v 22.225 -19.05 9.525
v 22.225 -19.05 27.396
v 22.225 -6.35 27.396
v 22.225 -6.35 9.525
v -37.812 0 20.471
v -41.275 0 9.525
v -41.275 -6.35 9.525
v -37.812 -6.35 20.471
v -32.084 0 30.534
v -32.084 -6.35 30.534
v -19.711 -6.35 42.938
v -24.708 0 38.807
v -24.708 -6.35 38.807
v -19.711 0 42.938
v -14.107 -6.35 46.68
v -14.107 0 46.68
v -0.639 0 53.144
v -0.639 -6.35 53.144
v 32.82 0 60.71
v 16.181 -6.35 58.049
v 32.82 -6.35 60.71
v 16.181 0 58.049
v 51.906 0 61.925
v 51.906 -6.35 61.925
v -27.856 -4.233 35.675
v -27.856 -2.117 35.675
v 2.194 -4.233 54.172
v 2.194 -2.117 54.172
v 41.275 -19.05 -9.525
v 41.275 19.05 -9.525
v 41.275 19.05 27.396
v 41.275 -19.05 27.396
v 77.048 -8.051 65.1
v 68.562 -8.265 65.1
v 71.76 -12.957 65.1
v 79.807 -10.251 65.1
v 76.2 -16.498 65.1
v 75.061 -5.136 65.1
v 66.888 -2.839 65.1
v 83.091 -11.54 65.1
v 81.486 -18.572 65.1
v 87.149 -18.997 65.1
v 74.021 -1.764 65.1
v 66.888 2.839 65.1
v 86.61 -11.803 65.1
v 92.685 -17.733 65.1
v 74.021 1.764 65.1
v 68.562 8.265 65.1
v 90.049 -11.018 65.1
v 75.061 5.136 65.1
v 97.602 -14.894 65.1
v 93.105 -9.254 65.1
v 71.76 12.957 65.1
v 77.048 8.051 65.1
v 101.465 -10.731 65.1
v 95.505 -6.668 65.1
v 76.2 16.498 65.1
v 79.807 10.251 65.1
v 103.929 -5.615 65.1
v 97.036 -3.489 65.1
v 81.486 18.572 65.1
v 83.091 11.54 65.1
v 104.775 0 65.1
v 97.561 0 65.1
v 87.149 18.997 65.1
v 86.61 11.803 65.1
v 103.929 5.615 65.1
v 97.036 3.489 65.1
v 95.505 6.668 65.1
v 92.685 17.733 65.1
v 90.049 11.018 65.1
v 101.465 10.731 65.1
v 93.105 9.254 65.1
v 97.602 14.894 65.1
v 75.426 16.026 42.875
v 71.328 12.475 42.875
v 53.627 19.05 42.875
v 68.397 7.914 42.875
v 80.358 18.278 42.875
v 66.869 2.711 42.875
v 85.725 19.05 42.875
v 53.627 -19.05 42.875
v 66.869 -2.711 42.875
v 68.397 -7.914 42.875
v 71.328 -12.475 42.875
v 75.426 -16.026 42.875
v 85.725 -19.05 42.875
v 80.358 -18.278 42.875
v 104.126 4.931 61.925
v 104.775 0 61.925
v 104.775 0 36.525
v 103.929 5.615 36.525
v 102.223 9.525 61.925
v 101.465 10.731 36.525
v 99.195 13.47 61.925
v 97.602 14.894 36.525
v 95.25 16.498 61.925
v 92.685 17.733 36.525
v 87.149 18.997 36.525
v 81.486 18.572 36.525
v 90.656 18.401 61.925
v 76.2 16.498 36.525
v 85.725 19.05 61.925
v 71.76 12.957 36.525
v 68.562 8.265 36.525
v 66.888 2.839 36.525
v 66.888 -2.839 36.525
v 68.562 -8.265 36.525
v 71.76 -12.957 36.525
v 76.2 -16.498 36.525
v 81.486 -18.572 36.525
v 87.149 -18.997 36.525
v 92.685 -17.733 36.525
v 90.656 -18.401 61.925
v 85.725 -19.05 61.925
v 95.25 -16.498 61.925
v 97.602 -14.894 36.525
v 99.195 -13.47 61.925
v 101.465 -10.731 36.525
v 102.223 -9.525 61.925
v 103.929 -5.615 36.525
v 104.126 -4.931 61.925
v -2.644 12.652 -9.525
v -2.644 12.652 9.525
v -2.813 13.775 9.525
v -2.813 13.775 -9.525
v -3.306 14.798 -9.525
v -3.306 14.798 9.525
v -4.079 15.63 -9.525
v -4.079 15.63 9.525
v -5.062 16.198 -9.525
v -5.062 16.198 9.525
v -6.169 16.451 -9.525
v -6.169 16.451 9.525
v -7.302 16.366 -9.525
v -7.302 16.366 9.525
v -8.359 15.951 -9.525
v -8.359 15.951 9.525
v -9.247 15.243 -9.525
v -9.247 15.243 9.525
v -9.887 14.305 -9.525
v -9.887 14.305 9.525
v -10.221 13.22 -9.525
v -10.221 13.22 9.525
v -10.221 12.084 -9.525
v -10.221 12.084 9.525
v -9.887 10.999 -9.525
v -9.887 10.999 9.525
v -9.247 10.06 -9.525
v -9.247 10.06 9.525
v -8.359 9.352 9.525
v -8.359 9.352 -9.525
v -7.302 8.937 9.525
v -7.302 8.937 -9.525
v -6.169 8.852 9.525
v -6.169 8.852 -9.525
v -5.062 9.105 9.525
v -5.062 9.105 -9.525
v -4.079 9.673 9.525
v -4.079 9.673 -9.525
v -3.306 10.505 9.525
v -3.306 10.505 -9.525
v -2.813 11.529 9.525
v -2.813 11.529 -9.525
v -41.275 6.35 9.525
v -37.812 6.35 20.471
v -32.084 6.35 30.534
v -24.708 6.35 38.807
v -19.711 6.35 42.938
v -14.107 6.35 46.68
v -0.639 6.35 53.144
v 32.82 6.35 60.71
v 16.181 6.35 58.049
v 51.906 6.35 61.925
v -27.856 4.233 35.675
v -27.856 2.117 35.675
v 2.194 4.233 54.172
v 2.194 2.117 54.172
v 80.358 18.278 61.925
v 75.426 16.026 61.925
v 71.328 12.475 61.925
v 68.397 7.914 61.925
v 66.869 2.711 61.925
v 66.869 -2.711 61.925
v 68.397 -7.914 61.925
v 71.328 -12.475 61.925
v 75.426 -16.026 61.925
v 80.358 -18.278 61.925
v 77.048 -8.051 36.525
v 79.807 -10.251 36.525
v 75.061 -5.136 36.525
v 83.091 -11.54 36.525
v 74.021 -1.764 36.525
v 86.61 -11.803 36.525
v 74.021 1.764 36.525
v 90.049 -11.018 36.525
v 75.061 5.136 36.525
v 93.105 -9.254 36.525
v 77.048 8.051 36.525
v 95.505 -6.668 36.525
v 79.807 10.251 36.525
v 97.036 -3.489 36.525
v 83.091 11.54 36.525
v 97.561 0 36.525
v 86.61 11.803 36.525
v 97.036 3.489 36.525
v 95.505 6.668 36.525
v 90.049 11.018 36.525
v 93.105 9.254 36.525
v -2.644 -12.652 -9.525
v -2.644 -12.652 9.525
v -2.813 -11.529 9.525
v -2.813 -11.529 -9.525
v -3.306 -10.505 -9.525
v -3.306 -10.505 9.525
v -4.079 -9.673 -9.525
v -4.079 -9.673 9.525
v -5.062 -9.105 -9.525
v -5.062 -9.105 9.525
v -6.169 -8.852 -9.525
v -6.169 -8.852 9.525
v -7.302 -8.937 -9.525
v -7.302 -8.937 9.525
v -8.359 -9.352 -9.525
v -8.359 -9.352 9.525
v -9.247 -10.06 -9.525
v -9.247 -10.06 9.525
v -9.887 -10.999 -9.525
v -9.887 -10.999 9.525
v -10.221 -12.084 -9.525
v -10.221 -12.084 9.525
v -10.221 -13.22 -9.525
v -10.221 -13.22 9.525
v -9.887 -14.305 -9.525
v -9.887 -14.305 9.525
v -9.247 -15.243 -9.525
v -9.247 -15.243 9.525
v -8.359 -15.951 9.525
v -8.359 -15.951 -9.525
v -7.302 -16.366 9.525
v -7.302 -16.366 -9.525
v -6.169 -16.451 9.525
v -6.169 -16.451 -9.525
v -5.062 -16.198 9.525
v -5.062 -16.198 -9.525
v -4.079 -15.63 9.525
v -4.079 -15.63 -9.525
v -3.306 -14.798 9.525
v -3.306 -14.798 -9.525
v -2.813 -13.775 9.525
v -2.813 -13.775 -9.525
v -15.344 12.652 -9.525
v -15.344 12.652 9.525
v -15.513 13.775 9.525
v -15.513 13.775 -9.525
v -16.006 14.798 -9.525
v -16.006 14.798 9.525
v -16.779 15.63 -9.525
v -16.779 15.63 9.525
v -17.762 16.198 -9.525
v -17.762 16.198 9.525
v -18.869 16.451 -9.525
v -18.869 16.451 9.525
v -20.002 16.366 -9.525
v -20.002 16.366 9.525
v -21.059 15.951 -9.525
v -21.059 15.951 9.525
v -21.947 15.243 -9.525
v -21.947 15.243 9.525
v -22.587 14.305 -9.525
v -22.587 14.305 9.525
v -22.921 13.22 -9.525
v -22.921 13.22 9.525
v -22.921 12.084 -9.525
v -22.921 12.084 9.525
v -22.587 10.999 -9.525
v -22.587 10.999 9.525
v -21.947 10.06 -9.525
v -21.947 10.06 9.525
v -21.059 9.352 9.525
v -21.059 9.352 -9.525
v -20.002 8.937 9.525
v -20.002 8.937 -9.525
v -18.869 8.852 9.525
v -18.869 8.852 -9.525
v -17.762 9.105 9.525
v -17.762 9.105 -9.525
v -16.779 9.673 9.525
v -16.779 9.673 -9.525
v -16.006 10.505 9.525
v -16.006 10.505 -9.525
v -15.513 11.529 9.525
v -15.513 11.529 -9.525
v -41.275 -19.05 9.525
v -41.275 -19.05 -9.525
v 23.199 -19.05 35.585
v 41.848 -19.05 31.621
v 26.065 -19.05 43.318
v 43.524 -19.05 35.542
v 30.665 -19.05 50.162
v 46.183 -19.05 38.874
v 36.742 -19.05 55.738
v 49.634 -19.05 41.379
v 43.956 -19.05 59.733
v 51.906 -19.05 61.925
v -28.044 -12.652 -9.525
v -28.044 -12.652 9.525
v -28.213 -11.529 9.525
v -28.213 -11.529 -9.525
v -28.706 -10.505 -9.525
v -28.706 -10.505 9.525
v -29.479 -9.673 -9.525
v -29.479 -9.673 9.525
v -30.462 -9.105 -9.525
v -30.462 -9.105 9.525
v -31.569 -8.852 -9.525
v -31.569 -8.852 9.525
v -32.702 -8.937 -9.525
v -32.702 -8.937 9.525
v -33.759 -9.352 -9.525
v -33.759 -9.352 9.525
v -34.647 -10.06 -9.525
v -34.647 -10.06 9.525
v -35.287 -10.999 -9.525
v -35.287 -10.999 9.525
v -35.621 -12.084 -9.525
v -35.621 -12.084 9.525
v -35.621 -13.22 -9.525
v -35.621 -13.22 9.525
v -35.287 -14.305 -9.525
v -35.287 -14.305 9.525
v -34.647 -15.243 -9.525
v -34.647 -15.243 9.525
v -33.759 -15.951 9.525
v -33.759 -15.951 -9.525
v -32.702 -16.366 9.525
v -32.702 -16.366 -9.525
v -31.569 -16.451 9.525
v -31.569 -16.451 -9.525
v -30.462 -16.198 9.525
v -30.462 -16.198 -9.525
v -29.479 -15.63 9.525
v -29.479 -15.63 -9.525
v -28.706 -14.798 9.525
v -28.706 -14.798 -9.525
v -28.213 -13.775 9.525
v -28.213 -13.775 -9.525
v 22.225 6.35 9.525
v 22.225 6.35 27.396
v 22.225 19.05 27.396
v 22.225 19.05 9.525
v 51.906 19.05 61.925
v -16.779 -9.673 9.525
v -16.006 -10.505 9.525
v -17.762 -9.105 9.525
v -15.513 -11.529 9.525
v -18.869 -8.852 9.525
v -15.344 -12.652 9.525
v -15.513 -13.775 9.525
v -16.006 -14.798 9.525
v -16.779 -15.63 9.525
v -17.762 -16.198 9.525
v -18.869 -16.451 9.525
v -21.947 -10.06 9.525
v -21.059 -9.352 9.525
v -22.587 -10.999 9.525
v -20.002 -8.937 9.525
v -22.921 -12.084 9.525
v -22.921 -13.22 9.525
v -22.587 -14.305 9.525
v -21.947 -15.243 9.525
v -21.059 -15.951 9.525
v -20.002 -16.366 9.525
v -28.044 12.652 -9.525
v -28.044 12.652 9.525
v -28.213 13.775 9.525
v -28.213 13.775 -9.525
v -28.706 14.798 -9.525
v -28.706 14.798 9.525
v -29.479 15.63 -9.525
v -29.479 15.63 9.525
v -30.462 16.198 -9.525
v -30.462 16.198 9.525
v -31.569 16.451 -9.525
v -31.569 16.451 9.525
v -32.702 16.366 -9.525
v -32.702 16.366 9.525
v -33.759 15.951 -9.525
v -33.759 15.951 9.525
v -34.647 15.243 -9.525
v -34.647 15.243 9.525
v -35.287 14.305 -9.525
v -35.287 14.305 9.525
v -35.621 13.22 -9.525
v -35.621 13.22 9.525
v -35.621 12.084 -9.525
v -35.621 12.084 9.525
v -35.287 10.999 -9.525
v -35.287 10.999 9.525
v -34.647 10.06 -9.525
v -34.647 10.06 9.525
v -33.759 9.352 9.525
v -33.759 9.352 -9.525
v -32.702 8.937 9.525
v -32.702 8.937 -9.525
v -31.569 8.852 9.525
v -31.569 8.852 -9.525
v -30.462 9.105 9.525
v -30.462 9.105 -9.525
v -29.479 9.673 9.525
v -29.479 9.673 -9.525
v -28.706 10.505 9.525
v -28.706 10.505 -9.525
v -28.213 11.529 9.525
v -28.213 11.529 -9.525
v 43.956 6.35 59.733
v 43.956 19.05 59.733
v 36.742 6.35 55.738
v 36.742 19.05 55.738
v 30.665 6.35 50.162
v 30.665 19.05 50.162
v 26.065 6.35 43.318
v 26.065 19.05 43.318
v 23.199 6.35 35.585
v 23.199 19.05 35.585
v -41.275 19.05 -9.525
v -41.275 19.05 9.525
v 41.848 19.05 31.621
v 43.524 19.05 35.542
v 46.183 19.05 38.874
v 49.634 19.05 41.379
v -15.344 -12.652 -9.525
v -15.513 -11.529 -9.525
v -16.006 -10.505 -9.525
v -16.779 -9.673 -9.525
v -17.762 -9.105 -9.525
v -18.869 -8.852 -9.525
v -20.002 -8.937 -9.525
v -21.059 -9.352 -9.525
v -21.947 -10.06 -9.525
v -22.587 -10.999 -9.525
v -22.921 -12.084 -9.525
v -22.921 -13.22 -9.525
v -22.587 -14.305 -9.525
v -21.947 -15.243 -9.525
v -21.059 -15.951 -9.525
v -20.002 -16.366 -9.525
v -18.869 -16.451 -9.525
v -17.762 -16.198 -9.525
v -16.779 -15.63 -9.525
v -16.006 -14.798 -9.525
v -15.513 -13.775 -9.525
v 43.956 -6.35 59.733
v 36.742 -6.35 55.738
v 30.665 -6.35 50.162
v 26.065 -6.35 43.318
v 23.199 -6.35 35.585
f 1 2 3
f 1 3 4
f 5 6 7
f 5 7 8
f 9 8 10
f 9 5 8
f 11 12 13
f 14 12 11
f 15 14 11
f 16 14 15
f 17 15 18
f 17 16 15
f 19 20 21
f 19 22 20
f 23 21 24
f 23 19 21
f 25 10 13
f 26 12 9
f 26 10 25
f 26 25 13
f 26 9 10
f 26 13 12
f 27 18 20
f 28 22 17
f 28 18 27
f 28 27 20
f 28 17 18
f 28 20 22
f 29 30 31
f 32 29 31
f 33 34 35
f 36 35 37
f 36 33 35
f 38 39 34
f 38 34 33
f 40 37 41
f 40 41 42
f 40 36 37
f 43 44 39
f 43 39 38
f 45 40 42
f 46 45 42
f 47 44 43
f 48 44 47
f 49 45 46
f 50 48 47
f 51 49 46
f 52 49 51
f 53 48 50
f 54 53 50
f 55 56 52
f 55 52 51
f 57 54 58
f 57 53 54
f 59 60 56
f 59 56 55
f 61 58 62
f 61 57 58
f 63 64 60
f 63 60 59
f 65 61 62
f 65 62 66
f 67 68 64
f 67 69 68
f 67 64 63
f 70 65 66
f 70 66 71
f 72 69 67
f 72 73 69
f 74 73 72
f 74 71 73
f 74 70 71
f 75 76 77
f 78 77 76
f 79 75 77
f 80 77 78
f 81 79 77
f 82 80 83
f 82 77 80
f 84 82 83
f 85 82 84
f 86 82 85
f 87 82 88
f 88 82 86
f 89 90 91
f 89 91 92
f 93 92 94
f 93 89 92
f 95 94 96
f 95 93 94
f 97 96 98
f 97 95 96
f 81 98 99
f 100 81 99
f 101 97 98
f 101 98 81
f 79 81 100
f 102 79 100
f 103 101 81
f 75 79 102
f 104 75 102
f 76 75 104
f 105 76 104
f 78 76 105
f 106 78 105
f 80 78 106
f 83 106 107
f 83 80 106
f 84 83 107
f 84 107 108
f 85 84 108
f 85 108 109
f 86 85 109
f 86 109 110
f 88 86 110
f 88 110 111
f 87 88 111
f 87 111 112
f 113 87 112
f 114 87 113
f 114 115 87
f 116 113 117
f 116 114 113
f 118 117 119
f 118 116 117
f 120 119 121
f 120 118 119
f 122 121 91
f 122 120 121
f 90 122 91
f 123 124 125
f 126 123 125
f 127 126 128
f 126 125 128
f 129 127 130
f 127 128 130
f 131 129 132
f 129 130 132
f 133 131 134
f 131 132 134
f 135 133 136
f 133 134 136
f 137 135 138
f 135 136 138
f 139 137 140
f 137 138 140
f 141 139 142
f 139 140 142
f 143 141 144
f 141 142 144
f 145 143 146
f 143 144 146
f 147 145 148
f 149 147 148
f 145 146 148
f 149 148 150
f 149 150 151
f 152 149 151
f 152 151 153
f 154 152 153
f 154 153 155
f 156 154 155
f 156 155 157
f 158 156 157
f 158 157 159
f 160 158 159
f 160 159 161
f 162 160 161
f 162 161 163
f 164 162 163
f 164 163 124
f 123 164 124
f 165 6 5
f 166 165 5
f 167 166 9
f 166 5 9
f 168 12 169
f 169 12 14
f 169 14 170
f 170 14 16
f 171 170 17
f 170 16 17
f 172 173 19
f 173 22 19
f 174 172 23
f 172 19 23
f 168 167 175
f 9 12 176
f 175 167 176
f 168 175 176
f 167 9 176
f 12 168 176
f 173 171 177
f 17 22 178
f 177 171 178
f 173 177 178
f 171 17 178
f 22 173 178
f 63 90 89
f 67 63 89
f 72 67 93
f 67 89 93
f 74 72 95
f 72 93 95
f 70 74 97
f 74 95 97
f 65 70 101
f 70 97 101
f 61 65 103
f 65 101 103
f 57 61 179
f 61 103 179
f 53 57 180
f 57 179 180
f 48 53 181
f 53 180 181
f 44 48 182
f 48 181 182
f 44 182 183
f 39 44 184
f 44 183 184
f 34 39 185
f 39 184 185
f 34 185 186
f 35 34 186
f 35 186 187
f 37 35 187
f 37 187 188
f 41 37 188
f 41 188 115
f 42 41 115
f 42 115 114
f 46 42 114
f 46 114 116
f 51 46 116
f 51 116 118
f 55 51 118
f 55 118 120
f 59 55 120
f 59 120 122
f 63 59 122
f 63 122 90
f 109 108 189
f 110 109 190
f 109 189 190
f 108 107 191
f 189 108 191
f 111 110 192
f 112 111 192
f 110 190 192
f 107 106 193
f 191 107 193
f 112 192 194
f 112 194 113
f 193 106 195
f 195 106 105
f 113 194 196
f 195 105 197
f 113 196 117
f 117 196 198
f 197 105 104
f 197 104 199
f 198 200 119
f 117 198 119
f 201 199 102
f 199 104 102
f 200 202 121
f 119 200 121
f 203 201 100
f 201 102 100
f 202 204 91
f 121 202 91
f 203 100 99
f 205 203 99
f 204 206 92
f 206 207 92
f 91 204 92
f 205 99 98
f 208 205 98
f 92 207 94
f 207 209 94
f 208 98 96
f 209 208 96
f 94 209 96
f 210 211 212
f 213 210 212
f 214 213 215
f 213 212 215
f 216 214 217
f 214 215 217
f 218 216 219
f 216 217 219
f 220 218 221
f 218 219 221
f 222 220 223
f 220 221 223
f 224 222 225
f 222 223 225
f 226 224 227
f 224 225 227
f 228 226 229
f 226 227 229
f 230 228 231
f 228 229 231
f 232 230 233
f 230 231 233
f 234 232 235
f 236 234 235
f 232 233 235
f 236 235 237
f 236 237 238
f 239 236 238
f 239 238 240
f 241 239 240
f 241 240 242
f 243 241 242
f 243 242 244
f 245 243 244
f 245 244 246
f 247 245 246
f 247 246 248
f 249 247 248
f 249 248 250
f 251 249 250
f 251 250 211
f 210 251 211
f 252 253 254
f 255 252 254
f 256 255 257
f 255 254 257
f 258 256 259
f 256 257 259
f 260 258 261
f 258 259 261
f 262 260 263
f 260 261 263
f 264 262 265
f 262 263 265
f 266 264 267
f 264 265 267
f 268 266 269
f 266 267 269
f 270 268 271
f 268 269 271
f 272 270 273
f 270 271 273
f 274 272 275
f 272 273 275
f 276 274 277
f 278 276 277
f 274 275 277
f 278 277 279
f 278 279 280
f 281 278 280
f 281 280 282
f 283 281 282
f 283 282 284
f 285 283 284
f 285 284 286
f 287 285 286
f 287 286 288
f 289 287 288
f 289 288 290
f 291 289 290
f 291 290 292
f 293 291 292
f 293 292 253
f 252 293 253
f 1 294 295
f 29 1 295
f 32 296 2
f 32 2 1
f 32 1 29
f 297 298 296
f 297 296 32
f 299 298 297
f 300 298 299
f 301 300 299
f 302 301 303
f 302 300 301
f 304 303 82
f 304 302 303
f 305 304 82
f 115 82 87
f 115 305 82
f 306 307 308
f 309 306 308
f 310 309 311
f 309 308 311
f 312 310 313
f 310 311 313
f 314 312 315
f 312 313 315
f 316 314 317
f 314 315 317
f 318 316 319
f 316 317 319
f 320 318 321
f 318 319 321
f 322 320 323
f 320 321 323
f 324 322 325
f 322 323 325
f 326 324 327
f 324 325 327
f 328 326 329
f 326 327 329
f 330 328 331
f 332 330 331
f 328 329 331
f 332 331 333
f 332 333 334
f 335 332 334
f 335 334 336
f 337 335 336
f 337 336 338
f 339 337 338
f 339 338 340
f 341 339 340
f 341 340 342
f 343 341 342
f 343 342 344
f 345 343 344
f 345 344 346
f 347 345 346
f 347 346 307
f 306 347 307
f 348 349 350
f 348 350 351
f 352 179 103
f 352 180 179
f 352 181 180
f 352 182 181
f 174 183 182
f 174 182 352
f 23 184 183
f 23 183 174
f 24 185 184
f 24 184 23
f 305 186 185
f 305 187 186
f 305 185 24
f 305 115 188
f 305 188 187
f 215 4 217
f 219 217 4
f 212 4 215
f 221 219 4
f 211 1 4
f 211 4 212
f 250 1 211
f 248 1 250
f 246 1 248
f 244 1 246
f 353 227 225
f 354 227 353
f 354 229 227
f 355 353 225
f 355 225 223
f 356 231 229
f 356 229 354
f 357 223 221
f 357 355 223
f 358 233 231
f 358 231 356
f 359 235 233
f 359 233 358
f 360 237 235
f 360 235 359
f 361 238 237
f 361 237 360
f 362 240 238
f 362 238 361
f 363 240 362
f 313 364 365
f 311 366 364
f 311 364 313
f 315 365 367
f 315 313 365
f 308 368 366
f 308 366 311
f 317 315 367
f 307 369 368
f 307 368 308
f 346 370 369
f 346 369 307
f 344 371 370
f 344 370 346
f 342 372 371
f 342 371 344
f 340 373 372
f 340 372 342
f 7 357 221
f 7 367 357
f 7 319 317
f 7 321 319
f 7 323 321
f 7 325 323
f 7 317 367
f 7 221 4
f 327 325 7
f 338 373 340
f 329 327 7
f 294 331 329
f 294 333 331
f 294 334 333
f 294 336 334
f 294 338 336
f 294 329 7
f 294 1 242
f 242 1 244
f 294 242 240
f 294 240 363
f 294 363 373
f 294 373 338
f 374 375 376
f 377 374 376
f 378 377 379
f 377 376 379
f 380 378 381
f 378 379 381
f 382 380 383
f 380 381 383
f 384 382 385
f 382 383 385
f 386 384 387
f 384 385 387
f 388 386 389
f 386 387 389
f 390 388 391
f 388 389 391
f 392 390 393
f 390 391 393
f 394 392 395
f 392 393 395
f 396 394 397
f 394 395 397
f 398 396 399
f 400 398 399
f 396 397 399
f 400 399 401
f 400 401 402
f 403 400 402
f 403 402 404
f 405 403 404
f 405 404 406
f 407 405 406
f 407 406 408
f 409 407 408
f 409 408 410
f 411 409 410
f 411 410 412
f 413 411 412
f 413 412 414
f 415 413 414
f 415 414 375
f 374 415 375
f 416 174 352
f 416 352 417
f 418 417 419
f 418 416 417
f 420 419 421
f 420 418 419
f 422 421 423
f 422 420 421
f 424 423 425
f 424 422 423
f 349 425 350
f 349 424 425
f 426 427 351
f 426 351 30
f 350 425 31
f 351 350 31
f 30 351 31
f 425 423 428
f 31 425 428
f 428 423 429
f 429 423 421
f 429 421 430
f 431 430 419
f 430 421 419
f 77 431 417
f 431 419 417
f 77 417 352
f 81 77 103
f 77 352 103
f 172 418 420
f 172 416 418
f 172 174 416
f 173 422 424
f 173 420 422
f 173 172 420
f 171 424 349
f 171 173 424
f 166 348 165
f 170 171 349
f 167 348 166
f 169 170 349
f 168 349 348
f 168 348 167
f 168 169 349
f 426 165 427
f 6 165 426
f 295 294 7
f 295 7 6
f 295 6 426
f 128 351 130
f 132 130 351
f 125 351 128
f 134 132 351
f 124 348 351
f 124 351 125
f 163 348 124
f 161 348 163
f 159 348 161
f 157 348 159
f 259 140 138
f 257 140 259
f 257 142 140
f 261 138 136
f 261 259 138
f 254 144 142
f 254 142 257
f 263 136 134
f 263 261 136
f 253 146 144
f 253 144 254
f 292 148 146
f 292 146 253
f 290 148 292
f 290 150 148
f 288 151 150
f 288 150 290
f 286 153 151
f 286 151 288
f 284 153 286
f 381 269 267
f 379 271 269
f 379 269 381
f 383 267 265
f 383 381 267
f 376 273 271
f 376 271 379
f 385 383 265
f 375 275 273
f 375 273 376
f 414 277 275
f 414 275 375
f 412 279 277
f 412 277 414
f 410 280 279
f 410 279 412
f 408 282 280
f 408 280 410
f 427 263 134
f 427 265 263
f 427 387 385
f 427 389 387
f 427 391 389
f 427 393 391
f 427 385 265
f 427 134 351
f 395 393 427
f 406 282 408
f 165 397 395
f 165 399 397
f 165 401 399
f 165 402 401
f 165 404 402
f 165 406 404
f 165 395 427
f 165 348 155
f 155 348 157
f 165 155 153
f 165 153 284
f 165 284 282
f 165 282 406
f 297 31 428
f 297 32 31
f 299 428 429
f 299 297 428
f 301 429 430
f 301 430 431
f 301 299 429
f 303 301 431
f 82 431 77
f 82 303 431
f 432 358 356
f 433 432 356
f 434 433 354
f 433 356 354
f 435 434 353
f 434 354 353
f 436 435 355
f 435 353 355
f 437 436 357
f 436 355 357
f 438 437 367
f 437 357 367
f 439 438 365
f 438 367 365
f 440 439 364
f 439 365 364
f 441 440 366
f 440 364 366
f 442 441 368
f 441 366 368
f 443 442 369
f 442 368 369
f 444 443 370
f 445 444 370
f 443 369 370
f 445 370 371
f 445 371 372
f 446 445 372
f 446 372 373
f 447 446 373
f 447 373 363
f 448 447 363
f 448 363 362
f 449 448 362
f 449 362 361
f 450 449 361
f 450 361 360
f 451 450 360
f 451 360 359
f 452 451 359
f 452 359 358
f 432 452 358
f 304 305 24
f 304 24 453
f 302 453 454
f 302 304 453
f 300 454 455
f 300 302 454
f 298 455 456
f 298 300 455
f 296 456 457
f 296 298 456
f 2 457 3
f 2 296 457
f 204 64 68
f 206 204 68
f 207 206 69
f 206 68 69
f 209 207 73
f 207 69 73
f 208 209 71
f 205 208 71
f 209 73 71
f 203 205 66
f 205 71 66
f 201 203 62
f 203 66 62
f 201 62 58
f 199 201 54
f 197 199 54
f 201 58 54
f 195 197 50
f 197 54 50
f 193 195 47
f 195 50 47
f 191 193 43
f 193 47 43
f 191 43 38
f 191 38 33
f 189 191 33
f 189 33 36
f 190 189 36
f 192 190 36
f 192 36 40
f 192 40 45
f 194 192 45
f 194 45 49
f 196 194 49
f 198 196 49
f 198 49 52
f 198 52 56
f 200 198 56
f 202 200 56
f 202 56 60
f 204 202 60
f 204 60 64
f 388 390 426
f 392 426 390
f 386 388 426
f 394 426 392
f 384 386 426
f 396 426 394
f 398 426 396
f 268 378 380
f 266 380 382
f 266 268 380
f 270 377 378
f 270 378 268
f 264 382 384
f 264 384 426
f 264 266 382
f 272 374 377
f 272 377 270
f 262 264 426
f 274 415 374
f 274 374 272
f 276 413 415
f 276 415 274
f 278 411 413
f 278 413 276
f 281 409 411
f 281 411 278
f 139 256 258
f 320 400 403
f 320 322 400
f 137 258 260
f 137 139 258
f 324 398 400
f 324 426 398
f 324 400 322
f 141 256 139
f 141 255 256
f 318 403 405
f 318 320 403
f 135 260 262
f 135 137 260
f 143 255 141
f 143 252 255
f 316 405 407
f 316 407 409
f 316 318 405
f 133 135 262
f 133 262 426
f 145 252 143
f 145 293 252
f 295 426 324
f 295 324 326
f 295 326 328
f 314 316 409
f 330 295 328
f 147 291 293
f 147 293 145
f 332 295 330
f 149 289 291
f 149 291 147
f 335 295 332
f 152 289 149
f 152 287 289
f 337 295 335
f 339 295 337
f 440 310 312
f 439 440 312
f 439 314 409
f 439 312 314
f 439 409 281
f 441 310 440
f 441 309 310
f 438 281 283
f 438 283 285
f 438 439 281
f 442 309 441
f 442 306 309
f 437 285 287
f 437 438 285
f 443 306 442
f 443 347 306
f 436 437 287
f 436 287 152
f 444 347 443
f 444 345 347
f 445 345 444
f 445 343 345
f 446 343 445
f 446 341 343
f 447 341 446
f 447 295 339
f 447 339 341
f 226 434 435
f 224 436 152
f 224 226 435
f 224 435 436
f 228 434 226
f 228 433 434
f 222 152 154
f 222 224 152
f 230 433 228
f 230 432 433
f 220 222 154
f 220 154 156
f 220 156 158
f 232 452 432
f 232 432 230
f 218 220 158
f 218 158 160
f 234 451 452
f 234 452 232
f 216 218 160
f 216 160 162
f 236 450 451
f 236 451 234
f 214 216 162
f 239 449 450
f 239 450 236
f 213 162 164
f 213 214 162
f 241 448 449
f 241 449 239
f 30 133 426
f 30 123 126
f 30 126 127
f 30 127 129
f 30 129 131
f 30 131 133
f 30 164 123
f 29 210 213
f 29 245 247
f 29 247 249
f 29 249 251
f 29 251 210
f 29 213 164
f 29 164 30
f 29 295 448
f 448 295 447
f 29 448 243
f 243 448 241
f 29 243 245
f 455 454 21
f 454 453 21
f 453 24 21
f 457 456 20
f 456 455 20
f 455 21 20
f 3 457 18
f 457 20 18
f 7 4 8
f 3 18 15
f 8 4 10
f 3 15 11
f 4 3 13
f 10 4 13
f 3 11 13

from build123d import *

# Parameters (mm, degrees)
F0_W          = 25.4
F0_H          = 19.05
F1_DEPTH      = 19.05
F2_DEPTH      = 6.35
F4_DEPTH      = 3.175
F4_DEPTH_BACK = 25.4
F5_R          = 11.8364
F6_DEPTH      = 50.8
F7_R          = 3.81
F8_DEPTH      = 25.4


with BuildPart() as f1:
    # F0 (on Front) → F1 (new body, symmetric)
    with BuildSketch(Plane.XZ):
        with BuildLine():
            Line((22.225, 9.525), (41.275, 9.525))
            Line((41.275, 9.525), (41.275, 27.3961414351))
            ThreePointArc((41.275, 27.3961414351), (44.7413406712, 37.2976968008), (53.6265966817, 42.8752))
            Line((53.6265966817, 42.8752), (60.325, 42.8752))
            Line((60.325, 42.8752), (60.325, 61.9252))
            Line((60.325, 61.9252), (51.9059805855, 61.9252))
            ThreePointArc((51.9059805855, 61.9252), (30.6650702941, 50.1624350173), (22.225, 27.3961414351))
            Line((22.225, 27.3961414351), (22.225, 9.525))
        make_face()
        Polygon((-41.275, -9.525), (41.275, -9.525), (41.275, 9.525), (22.225, 9.525), (-41.275, 9.525), align=None)
        with Locations((73.025, 52.4002)):
            Rectangle(F0_W, F0_H)
    extrude(amount=F1_DEPTH, both=True)

    # F0 (on Front) → F2 (join, symmetric)
    with BuildSketch(Plane.XZ):
        with BuildLine():
            add(Edge.make_bspline(
                [(-41.275, 9.525), (-35.163089633, 38.4709127247), (-8.6453789845, 60.5748556554), (51.9059805855, 61.9252)],
                knots=[0, 0, 0, 0, 106.9040509191, 106.9040509191, 106.9040509191, 106.9040509191], degree=3))
            Line((-41.275, 9.525), (22.225, 9.525))
            Line((22.225, 9.525), (22.225, 27.3961414351))
            ThreePointArc((22.225, 27.3961414351), (30.6650702941, 50.1624350173), (51.9059805855, 61.9252))
        make_face()
    extrude(amount=F2_DEPTH, both=True)

    # F3 (on face) → F4 (join, two sides)
    with BuildSketch(Plane.XY.offset(61.9252)) as f4_sk:
        with BuildLine():
            Line((85.725, -19.05), (85.725, 19.05))
            ThreePointArc((85.725, 19.05), (66.675, 0), (85.725, -19.05))
        make_face()
        with BuildLine():
            ThreePointArc((85.725, -19.05), (99.1953841816, -13.4703841816), (104.775, 0))
            ThreePointArc((104.775, 0), (99.1953841816, 13.4703841816), (85.725, 19.05))
            Line((85.725, 19.05), (85.725, -19.05))
        make_face()
    extrude(amount=F4_DEPTH)
    extrude(f4_sk.sketch, amount=-F4_DEPTH_BACK)

    # F5 (on face) → F6 (cut)
    with BuildSketch(Plane.XY.offset(65.1002)):
        with Locations((85.725, 0)):
            Circle(F5_R)
    extrude(amount=-F6_DEPTH, mode=Mode.SUBTRACT)

    # F7 (on face) → F8 (cut)
    with BuildSketch(Plane.XY.offset(9.525)):
        with Locations((-6.4540371954, -12.6517117023)):
            Circle(F7_R)
        with Locations((-19.1540371954, -12.6517117023)):
            Circle(F7_R)
        with Locations((-31.8540371954, -12.6517117023)):
            Circle(F7_R)
        with Locations((-6.4540371954, 12.6517117023)):
            Circle(F7_R)
        with Locations((-19.1540371954, 12.6517117023)):
            Circle(F7_R)
        with Locations((-31.8540371954, 12.6517117023)):
            Circle(F7_R)
    extrude(amount=-F8_DEPTH, mode=Mode.SUBTRACT)


solid = f1.part
